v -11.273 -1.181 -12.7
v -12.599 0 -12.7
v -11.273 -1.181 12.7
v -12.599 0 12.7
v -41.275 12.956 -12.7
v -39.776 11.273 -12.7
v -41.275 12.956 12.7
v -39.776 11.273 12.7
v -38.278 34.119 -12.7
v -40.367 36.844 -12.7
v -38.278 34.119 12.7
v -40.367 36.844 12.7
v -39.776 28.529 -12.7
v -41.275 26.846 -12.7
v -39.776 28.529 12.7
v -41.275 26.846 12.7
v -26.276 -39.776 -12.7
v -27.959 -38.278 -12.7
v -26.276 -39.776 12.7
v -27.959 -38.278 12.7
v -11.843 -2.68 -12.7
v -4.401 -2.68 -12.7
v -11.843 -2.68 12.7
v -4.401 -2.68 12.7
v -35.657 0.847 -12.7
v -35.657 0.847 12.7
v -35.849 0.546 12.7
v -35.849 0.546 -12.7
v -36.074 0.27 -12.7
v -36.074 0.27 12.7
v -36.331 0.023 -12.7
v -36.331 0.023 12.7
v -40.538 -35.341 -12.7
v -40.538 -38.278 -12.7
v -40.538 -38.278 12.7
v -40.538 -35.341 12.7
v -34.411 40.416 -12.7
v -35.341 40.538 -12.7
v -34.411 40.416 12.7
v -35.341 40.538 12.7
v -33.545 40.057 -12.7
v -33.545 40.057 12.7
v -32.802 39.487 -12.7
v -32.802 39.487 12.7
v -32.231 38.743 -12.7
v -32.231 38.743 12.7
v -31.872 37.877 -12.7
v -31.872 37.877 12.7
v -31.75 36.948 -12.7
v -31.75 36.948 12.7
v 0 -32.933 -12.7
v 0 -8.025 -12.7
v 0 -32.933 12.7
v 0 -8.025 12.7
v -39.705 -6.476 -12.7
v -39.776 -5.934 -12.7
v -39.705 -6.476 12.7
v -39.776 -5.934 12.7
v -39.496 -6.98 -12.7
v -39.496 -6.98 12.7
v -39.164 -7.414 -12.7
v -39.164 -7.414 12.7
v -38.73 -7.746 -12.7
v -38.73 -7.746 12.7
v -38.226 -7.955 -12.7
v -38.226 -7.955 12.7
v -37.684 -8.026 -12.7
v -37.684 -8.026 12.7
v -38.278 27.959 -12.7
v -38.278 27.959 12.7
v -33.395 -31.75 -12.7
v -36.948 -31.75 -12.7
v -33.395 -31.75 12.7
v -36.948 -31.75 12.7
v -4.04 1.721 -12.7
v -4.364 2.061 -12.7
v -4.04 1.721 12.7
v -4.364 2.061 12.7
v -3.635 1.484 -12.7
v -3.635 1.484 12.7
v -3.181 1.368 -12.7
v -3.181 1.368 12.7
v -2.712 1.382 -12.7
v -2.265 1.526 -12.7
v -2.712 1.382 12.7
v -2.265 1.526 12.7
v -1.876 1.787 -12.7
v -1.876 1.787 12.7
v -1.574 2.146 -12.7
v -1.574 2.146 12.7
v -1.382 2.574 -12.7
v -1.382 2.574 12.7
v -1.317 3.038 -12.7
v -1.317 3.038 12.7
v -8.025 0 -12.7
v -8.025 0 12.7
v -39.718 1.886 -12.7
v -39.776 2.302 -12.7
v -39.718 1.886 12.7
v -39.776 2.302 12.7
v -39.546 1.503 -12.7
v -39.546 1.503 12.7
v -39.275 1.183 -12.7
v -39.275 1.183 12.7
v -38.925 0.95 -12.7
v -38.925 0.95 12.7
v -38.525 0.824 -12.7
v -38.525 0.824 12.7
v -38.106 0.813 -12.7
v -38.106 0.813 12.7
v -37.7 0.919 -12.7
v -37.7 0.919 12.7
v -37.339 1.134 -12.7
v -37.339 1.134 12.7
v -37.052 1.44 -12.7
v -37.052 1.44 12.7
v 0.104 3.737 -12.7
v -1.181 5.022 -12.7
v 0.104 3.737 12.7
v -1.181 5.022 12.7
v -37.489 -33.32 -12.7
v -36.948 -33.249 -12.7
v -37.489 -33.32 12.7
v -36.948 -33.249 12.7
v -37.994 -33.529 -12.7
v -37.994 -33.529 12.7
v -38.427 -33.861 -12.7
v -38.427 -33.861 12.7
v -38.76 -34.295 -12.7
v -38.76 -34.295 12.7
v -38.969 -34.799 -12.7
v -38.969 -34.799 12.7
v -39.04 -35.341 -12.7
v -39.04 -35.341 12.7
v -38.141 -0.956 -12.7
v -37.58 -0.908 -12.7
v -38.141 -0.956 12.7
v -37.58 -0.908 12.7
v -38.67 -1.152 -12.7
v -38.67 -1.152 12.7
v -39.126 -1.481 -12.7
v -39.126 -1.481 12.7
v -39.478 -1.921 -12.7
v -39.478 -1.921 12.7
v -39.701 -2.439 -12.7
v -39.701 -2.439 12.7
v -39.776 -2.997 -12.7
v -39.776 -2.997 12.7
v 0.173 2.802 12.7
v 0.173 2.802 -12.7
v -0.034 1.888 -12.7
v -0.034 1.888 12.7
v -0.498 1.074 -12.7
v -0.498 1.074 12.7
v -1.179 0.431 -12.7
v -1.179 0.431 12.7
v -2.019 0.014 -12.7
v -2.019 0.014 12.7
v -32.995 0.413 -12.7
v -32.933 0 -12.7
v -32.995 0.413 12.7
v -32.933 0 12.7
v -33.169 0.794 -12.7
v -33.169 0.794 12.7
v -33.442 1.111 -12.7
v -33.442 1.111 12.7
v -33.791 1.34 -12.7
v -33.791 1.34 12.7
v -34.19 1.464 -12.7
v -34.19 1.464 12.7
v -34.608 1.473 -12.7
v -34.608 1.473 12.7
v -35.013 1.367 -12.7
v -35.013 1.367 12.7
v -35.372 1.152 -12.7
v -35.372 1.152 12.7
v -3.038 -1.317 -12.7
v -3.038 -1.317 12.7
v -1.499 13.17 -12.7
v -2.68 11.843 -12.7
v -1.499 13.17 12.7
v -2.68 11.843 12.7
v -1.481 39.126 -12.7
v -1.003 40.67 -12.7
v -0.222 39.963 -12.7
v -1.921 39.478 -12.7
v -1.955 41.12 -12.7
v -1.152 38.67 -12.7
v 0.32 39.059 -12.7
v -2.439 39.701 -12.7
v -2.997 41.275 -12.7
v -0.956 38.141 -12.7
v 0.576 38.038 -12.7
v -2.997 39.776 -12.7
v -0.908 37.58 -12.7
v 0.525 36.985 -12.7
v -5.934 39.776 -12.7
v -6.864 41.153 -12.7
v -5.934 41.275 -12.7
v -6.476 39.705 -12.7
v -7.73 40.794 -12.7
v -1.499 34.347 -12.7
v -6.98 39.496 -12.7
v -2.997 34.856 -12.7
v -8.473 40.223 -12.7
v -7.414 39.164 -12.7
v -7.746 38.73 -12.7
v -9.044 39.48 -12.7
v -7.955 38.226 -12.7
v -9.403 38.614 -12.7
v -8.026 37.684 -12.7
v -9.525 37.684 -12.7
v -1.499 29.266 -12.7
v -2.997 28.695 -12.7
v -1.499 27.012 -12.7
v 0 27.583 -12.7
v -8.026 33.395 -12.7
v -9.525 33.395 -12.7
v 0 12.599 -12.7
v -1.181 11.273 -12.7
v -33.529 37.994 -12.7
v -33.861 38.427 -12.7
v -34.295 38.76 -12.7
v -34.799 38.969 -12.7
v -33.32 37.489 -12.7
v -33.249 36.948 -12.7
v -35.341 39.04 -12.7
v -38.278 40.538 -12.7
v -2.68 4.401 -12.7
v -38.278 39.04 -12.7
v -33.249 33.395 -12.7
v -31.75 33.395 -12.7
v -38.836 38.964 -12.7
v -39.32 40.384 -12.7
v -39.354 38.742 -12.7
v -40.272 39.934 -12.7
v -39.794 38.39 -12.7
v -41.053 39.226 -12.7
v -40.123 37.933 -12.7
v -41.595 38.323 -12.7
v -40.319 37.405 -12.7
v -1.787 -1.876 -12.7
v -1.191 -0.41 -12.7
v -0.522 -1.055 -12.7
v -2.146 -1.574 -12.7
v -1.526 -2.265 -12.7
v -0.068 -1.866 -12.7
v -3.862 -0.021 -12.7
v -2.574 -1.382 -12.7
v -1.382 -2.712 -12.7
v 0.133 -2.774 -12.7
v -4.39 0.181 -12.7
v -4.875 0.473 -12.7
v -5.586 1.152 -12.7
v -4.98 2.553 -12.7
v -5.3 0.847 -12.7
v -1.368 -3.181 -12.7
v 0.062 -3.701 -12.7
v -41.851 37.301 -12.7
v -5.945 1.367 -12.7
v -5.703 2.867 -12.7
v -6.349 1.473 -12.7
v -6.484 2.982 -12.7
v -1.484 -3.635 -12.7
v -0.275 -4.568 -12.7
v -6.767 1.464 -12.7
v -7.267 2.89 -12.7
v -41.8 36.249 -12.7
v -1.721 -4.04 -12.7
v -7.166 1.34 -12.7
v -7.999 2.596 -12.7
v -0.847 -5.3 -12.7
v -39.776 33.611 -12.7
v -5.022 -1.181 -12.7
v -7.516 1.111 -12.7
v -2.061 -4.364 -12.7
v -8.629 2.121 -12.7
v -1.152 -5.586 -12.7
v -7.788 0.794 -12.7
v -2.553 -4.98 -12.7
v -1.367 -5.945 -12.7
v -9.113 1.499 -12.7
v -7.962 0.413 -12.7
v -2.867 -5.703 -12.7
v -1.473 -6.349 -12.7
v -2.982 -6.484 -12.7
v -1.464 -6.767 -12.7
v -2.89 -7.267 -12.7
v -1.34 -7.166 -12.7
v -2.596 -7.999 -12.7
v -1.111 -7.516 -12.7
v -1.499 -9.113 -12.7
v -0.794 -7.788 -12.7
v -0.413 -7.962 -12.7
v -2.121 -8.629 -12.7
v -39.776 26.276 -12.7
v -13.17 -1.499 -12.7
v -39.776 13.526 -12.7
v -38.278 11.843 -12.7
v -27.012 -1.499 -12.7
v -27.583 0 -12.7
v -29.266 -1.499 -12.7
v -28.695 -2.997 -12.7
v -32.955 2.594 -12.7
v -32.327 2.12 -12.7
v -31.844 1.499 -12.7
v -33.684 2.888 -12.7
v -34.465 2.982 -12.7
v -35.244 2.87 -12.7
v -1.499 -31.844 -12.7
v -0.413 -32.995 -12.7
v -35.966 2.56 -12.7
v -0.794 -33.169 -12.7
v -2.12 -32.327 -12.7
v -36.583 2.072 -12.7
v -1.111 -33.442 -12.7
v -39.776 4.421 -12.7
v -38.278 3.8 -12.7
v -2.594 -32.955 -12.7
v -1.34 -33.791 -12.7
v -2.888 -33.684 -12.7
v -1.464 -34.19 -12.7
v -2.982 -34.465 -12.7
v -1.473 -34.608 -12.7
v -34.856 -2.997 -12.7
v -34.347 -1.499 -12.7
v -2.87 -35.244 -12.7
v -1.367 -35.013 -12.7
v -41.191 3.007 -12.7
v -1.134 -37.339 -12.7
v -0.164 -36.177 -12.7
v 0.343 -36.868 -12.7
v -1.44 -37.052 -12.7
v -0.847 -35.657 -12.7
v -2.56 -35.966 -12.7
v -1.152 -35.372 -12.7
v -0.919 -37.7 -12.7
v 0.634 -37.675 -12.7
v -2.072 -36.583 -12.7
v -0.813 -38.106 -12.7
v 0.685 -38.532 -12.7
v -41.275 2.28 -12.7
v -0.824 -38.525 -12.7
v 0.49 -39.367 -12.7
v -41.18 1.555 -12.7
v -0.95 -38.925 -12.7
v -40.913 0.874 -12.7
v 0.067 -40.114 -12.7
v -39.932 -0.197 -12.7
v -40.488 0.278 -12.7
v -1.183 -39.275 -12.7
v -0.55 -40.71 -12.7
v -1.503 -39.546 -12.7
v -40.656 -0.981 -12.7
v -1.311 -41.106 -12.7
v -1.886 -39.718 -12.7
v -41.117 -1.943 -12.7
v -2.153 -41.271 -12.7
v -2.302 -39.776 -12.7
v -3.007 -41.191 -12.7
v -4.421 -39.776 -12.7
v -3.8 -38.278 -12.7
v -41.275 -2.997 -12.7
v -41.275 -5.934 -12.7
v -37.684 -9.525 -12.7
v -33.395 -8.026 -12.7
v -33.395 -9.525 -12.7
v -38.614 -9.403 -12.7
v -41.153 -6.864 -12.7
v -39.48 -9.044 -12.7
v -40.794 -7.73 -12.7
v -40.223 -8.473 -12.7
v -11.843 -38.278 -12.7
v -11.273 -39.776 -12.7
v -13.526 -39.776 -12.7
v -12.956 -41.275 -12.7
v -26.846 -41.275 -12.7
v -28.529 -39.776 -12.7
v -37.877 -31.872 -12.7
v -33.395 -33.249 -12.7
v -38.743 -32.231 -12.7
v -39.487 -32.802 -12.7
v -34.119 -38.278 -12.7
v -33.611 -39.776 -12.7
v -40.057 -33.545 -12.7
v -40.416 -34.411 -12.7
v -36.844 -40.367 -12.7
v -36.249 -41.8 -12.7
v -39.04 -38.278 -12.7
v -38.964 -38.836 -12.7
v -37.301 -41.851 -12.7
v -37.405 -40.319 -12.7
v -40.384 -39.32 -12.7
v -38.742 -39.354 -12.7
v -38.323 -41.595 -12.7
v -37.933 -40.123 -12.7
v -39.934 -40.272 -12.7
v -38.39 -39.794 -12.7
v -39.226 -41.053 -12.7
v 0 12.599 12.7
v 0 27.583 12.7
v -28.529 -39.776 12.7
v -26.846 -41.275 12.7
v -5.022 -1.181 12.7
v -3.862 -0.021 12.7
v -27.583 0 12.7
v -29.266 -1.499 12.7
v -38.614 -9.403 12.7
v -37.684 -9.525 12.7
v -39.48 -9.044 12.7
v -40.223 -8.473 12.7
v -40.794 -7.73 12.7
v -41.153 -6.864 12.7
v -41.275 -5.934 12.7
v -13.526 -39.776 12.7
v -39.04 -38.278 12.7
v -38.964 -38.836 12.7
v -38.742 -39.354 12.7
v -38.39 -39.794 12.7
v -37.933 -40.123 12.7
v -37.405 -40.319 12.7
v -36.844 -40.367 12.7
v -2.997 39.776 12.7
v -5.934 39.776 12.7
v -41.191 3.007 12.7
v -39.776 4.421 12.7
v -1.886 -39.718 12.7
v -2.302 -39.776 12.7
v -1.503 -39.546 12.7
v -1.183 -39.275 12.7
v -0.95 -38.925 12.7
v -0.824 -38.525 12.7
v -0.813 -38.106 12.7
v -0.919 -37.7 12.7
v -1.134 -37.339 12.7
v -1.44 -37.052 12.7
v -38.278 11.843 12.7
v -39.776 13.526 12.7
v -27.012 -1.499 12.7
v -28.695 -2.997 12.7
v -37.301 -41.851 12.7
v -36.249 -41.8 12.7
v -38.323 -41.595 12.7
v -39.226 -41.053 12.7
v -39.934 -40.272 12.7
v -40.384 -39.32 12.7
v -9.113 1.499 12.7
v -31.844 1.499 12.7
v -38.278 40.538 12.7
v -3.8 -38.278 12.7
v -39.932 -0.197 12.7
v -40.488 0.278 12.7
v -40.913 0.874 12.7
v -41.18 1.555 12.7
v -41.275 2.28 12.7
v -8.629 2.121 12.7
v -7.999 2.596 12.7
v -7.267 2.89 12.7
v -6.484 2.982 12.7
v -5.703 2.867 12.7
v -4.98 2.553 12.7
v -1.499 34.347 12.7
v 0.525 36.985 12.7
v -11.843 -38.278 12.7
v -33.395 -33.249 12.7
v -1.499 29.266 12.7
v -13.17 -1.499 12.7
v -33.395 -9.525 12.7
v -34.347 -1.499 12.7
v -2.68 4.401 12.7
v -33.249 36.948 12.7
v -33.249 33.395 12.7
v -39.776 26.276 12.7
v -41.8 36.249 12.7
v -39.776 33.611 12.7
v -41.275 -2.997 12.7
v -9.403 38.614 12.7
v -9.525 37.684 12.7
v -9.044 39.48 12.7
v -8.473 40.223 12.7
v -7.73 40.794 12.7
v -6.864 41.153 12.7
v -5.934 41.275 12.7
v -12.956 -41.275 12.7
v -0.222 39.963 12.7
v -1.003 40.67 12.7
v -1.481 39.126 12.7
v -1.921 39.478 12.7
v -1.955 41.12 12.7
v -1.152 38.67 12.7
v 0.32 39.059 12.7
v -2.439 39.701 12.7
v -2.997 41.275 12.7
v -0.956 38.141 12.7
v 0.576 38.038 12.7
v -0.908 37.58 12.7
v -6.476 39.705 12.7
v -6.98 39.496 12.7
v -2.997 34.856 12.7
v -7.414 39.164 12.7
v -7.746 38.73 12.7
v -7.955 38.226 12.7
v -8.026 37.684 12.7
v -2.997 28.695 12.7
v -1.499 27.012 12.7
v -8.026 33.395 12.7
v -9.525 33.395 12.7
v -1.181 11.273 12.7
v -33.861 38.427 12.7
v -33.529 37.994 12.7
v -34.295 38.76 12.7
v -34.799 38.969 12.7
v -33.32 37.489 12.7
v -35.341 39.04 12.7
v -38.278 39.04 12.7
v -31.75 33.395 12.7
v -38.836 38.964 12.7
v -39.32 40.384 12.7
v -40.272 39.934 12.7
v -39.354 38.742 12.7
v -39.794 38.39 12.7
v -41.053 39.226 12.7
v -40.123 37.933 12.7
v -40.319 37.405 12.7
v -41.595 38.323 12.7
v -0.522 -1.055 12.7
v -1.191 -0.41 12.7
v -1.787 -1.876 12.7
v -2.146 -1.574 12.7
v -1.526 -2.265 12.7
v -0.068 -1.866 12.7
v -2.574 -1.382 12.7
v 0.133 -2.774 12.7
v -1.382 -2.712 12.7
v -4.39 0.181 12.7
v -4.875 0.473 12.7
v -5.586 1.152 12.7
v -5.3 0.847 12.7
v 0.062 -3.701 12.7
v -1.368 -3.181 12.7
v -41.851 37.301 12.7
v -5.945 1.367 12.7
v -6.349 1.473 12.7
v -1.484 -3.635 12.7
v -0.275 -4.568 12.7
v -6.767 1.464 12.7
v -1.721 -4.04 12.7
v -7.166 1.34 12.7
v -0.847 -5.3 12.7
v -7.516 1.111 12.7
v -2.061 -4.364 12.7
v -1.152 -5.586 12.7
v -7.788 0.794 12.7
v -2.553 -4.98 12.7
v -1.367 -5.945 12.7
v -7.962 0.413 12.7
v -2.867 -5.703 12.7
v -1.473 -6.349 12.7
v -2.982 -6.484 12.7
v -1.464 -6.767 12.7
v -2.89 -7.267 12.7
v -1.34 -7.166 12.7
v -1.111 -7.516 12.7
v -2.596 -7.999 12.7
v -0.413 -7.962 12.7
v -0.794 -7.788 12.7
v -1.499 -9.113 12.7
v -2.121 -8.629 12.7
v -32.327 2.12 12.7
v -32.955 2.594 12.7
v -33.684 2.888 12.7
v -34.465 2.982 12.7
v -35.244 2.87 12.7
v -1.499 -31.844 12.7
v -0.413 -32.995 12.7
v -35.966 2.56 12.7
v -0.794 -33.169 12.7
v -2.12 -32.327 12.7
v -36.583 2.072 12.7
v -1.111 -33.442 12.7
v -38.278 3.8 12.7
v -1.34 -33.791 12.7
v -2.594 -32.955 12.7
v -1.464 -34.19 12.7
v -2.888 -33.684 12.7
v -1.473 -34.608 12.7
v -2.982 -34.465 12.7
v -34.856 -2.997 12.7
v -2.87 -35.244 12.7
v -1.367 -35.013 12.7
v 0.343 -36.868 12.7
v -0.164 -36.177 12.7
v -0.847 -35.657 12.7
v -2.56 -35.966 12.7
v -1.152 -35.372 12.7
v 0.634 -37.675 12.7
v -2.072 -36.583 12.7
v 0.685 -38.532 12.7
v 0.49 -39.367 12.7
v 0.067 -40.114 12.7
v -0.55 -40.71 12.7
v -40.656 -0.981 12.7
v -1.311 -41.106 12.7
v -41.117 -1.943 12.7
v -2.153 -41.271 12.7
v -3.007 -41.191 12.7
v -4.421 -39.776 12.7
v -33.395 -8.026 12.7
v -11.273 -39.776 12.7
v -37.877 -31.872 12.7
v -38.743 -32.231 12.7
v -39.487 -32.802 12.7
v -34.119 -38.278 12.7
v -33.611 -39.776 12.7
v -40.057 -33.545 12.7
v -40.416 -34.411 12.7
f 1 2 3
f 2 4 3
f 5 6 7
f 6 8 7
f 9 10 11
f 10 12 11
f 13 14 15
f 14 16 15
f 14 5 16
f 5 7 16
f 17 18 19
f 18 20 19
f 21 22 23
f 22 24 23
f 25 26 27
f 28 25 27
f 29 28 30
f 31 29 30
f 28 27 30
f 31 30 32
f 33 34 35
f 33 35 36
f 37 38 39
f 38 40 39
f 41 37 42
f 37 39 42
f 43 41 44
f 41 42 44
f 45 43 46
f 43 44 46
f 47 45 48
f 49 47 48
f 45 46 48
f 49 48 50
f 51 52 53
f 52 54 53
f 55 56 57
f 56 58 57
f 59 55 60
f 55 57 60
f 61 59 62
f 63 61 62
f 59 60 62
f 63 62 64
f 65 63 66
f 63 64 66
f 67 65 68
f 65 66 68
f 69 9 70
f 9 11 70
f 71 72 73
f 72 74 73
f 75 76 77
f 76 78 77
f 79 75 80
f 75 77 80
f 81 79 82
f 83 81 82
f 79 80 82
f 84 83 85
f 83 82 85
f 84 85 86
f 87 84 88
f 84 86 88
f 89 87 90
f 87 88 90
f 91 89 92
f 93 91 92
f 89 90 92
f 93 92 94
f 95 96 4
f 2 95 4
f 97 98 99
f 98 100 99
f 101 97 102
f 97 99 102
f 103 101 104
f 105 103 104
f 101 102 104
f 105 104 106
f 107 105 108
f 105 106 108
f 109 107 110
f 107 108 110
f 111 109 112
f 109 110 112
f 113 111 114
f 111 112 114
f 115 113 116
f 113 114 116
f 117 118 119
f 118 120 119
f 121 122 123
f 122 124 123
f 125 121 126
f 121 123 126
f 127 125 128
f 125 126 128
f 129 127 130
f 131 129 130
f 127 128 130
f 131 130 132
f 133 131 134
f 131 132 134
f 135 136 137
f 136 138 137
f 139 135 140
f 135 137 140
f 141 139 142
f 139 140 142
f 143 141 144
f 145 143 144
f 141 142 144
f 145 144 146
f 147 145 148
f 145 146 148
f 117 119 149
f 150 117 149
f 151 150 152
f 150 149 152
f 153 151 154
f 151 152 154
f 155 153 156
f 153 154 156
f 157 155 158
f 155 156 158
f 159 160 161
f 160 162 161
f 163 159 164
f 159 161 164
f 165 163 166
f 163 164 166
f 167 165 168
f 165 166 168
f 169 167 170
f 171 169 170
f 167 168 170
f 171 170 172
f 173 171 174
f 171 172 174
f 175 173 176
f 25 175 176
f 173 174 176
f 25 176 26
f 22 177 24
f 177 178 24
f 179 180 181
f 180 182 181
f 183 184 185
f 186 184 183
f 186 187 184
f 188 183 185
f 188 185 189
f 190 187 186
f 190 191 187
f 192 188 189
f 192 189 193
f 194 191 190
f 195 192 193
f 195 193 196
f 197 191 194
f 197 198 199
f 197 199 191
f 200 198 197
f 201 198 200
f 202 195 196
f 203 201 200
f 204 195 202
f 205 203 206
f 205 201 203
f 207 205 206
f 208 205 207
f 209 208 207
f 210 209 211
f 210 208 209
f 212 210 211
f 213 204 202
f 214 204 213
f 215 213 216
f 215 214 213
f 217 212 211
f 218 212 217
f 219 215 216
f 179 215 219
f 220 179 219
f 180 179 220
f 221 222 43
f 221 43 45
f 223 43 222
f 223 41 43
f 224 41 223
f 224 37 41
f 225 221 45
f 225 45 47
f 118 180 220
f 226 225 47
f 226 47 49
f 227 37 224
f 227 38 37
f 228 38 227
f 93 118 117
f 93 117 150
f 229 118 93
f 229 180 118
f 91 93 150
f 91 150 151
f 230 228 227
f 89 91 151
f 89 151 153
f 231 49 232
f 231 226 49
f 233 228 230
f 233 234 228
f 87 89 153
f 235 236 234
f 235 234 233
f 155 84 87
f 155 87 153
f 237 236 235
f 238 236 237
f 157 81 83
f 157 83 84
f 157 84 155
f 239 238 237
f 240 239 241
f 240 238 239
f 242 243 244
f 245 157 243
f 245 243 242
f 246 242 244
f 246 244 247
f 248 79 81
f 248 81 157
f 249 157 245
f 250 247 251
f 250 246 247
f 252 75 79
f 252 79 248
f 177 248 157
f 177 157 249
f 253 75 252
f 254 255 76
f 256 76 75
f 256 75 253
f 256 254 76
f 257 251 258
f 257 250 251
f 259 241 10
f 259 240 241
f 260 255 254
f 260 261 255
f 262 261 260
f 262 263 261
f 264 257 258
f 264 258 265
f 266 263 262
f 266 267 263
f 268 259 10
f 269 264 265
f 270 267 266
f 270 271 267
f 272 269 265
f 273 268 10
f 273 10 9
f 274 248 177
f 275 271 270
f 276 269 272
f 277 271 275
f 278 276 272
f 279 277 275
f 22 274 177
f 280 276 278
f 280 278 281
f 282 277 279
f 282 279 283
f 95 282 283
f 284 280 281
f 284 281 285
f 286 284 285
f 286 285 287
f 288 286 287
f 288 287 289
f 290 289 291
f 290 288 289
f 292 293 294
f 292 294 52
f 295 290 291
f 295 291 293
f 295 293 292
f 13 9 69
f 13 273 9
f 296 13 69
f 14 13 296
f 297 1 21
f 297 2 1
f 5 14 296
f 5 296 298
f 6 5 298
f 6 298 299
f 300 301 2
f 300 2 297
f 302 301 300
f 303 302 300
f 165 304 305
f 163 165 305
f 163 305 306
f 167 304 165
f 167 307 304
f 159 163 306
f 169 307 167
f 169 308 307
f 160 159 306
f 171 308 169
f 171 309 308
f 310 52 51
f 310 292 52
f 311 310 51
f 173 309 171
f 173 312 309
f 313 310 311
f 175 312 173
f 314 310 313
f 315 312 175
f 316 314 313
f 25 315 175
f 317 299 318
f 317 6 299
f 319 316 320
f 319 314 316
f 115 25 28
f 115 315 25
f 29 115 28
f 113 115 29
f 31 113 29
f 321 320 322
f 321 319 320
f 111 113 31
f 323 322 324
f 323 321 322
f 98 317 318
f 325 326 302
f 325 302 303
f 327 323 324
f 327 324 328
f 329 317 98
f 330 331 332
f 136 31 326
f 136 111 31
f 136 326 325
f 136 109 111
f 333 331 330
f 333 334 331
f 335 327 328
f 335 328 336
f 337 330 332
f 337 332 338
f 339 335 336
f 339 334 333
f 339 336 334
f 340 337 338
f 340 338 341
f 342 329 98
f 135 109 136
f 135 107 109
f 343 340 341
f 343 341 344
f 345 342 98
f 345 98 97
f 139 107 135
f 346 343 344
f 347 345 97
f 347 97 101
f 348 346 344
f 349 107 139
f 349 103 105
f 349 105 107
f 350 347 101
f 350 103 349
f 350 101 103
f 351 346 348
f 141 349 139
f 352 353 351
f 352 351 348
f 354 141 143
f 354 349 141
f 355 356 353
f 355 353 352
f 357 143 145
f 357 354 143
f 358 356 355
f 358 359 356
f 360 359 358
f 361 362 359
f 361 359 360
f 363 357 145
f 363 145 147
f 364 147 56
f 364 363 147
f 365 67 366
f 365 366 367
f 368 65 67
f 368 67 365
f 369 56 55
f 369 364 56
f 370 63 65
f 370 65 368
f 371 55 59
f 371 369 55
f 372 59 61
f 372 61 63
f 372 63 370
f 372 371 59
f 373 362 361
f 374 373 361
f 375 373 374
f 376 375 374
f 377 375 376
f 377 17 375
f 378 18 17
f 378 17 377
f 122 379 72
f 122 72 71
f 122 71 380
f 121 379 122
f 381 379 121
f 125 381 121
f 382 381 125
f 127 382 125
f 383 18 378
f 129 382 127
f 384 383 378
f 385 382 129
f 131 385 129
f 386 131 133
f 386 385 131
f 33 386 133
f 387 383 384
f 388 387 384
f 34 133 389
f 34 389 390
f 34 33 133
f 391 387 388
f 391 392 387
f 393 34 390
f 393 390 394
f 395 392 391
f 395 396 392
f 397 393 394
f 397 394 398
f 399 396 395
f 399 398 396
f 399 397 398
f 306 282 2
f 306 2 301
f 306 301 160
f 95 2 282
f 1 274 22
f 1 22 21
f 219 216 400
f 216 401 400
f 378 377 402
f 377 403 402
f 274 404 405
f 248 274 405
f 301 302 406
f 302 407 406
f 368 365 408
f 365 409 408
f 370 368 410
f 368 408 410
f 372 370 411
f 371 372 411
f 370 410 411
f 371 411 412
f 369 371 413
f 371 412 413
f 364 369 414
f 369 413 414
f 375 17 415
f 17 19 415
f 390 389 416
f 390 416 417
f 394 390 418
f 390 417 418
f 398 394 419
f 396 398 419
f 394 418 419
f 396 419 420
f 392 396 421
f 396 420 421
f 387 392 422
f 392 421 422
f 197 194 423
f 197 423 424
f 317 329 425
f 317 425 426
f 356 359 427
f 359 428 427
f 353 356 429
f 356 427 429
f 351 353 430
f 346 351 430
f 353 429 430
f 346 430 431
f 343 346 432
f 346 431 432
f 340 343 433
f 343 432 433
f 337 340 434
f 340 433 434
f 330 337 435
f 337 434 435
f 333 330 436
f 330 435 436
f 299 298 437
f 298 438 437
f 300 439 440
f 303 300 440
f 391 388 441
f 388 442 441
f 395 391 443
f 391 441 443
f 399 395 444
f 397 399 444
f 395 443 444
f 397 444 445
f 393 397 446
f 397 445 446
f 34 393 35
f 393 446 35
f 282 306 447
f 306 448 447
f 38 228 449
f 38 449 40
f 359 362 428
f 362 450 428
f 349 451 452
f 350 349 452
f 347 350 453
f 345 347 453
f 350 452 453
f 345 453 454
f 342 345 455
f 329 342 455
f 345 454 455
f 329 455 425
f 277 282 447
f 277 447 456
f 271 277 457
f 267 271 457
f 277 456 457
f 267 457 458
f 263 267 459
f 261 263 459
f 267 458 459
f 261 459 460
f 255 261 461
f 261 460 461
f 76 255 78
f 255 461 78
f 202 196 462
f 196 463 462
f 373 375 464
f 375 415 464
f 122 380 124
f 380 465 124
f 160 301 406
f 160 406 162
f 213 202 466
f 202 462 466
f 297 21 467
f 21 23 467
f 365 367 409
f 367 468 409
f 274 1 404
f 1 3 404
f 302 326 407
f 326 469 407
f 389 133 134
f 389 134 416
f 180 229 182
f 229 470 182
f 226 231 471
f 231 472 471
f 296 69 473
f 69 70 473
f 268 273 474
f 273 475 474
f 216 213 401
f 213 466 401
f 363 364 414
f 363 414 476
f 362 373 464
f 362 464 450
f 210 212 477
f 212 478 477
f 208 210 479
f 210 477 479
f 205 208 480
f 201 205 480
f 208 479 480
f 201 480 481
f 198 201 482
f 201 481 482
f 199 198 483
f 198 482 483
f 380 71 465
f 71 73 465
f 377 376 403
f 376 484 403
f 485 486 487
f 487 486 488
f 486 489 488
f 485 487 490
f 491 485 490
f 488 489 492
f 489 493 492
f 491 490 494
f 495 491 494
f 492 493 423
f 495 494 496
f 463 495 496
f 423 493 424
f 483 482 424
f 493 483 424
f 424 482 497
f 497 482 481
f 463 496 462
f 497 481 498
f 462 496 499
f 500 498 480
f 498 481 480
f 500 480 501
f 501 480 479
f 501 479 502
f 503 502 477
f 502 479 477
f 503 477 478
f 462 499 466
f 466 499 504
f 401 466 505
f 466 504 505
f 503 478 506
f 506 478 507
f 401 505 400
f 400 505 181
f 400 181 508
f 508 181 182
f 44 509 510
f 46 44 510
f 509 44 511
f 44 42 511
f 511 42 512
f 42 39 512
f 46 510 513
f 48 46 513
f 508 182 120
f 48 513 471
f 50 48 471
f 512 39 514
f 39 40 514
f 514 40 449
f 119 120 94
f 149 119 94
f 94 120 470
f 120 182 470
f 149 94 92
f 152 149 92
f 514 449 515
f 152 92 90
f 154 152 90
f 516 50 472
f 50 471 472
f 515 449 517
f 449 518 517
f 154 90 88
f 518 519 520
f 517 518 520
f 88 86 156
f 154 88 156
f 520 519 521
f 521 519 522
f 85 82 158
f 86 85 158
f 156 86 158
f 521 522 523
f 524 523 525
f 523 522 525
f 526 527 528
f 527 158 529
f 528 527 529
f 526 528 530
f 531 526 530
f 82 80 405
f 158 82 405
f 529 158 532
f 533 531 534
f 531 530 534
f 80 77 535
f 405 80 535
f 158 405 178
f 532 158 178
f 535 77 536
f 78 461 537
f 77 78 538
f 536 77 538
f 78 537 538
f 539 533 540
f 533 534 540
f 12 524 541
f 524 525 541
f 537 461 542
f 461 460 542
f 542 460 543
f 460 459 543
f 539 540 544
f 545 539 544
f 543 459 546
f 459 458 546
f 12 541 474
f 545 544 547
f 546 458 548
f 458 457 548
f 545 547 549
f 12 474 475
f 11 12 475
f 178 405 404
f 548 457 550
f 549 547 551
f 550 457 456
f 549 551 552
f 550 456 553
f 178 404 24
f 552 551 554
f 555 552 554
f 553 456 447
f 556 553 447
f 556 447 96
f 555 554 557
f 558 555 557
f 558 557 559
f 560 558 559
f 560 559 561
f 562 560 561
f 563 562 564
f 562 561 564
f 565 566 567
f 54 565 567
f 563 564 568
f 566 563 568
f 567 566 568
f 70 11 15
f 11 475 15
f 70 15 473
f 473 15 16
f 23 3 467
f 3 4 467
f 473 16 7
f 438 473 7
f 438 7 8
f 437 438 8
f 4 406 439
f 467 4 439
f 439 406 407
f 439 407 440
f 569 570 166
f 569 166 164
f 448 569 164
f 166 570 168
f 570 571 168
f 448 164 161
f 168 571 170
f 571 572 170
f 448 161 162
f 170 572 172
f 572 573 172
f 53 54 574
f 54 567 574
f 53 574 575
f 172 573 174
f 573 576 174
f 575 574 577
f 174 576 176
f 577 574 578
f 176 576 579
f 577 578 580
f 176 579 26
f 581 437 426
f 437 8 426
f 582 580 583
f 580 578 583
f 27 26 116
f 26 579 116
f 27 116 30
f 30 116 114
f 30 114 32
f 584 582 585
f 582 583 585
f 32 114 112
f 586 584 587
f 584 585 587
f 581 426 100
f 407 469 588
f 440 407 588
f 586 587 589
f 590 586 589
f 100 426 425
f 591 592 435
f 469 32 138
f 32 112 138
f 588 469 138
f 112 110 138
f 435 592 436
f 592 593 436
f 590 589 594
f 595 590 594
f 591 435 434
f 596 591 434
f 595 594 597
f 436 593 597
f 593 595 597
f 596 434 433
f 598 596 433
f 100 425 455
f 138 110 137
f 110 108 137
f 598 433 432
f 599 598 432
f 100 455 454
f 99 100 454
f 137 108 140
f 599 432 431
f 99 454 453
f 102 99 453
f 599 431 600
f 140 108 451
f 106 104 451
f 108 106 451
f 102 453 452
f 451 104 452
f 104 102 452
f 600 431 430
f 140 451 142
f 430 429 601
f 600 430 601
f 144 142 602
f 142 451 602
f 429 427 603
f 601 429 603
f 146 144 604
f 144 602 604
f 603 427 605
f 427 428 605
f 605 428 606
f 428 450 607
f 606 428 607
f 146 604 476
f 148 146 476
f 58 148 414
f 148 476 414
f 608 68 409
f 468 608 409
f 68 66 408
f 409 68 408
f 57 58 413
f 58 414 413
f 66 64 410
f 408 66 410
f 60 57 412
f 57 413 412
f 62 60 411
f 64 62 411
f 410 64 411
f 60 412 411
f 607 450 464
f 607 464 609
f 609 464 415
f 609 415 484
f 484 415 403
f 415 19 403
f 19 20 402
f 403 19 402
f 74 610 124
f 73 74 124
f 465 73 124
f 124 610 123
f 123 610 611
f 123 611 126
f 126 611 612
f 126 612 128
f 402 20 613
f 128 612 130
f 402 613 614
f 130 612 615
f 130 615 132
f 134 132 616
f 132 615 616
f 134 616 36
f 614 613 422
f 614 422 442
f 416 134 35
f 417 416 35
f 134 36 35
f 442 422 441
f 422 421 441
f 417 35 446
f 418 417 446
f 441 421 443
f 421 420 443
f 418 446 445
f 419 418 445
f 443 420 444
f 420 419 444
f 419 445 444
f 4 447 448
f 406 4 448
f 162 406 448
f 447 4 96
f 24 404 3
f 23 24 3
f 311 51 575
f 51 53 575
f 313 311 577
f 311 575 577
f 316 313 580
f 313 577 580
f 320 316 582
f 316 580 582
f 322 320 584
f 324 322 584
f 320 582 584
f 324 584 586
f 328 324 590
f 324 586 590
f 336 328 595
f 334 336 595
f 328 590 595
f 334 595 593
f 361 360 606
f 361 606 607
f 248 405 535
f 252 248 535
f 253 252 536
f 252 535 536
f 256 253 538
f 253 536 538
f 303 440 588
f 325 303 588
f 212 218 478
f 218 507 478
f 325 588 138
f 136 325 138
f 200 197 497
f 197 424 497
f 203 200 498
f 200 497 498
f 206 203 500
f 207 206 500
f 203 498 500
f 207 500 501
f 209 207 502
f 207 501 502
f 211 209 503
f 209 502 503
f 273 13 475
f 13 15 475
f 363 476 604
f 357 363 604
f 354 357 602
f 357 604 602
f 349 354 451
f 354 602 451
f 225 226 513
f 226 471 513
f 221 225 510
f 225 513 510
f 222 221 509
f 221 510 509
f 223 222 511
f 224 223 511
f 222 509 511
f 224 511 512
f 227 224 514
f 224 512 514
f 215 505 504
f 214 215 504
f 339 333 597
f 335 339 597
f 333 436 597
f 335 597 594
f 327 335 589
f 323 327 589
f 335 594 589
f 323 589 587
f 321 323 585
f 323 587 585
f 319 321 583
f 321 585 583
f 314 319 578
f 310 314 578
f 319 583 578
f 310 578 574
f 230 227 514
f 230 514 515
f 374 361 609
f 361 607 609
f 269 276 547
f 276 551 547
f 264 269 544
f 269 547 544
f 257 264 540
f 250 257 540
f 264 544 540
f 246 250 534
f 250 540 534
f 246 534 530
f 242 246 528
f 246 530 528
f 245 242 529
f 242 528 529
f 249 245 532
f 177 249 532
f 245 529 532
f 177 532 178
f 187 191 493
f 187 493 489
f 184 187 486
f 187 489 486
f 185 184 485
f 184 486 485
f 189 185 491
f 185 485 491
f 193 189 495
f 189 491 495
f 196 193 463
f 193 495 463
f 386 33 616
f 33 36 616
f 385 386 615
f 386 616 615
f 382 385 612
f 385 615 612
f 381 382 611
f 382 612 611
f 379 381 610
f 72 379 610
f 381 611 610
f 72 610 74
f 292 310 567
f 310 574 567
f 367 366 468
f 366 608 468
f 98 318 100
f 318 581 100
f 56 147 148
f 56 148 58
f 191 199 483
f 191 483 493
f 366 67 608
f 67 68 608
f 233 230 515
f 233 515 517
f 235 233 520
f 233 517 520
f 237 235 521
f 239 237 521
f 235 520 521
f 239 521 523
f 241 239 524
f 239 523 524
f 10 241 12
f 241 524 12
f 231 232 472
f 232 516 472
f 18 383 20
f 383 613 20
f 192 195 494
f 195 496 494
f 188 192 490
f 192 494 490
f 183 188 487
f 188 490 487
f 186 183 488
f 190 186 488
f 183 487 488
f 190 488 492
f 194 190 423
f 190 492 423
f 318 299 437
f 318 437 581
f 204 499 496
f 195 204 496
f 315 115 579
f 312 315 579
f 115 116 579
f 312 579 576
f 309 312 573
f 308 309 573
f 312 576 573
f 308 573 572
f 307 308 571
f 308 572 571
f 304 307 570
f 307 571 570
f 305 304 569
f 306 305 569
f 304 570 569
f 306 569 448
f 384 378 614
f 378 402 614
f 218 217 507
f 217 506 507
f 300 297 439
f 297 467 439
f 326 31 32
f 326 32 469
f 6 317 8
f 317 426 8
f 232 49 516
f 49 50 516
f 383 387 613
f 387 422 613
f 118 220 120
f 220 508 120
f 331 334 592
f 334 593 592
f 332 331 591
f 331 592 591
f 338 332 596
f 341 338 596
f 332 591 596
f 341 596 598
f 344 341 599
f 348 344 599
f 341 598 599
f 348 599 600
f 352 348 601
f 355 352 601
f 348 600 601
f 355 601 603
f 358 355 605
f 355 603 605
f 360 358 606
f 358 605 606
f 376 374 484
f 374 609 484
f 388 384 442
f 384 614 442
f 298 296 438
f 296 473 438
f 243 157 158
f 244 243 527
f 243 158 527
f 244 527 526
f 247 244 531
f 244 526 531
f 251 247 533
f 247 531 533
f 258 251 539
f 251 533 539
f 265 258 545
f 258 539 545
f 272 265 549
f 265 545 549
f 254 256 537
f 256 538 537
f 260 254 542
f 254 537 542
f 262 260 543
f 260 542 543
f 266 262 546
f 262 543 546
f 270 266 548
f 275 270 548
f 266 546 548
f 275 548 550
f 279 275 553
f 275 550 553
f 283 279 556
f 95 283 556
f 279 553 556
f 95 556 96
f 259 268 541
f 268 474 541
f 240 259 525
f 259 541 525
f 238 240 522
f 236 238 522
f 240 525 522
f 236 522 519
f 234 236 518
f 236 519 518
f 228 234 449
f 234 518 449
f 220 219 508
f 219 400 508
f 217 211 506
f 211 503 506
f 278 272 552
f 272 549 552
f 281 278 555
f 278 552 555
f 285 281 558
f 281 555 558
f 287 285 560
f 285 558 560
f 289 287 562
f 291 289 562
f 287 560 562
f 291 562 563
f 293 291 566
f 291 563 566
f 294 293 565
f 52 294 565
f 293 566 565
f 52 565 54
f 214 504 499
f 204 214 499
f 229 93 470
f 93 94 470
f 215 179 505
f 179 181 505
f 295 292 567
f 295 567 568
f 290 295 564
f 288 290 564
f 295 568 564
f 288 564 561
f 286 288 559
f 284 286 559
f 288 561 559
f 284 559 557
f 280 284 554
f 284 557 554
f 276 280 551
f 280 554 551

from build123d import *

# Parameters (mm, degrees)
BASE_EXTRUDE_DEPTH = 12.7
CIRPATTERN1_COUNT  = 2
CIRPATTERN1_ANGLE  = 90


with BuildPart() as part:
    # Sketch1 → Base-Extrude (new, symmetric)
    with BuildSketch(Plane(origin=(-20.32, 17.78, 0), x_dir=(1, 0, 0), z_dir=(0, 0, 1))):
        with BuildLine():
            Line((17.3228, 17.075886512), (19.412382578, 19.800133504))
            ThreePointArc((19.412382578, 19.800133504), (18.838545845, 21.346344632), (17.3228, 21.9964))
            Line((17.3228, 21.9964), (14.38577367, 21.9964))
            ThreePointArc((14.38577367, 21.9964), (12.906383481, 21.383616519), (12.2936, 19.90422633))
            Line((12.2936, 19.90422633), (12.2936, 15.61465))
            Line((12.2936, 15.61465), (10.795, 15.61465))
            Line((10.795, 15.61465), (10.795, 19.90422633))
            ThreePointArc((10.795, 19.90422633), (11.846713258, 22.443286742), (14.38577367, 23.495))
            Line((14.38577367, 23.495), (17.3228, 23.495))
            ThreePointArc((17.3228, 23.495), (20.097934554, 22.182884653), (20.844928673, 19.2054666))
            Line((20.844928673, 19.2054666), (18.8214, 16.567335923))
            Line((18.8214, 16.567335923), (18.8214, 11.485729415))
            Line((18.8214, 11.485729415), (20.32, 9.8028125))
            Line((20.32, 9.8028125), (20.32, -5.180962694))
            Line((20.32, -5.180962694), (19.1389, -6.507329415))
            Line((19.1389, -6.507329415), (19.1389, -12.757931546))
            Line((19.1389, -12.757931546), (20.424084837, -14.043116383))
            ThreePointArc((20.424084837, -14.043116383), (18.821804006, -17.54486751), (15.019825564, -16.932883251))
            ThreePointArc((15.019825564, -16.932883251), (13.348875824, -16.363652979), (12.29528328, -17.78))
            Line((12.29528328, -17.78), (-12.61278328, -17.78))
            ThreePointArc((-12.61278328, -17.78), (-13.666375824, -16.363652979), (-15.337325564, -16.932883251))
            ThreePointArc((-15.337325564, -16.932883251), (-19.047442105, -18.270236732), (-20.870958003, -14.773342558))
            Line((-20.870958003, -14.773342558), (-19.4564, -13.358784555))
            Line((-19.4564, -13.358784555), (-19.4564, -6.507329415))
            Line((-19.4564, -6.507329415), (-20.955, -4.8244125))
            Line((-20.955, -4.8244125), (-20.955, 9.0662125))
            Line((-20.955, 9.0662125), (-19.4564, 10.749129415))
            Line((-19.4564, 10.749129415), (-19.4564, 15.830735923))
            Line((-19.4564, 15.830735923), (-21.479928673, 18.4688666))
            ThreePointArc((-21.479928673, 18.4688666), (-20.732934554, 21.446284653), (-17.9578, 22.7584))
            Line((-17.9578, 22.7584), (-15.02077367, 22.7584))
            ThreePointArc((-15.02077367, 22.7584), (-12.481713258, 21.706686742), (-11.43, 19.16762633))
            Line((-11.43, 19.16762633), (-11.43, 15.61465))
            Line((-11.43, 15.61465), (-12.9286, 15.61465))
            Line((-12.9286, 15.61465), (-12.9286, 19.16762633))
            ThreePointArc((-12.9286, 19.16762633), (-13.541383481, 20.647016519), (-15.02077367, 21.2598))
            Line((-15.02077367, 21.2598), (-17.9578, 21.2598))
            ThreePointArc((-17.9578, 21.2598), (-19.473545845, 20.609744632), (-20.047382578, 19.063533504))
            Line((-20.047382578, 19.063533504), (-17.9578, 16.339286512))
            Line((-17.9578, 16.339286512), (-17.9578, 10.17860201))
            Line((-17.9578, 10.17860201), (-19.4564, 8.495685095))
            Line((-19.4564, 8.495685095), (-19.4564, -4.253885095))
            Line((-19.4564, -4.253885095), (-17.9578, -5.93680201))
            Line((-17.9578, -5.93680201), (-17.9578, -13.979525))
            Line((-17.9578, -13.979525), (-19.4564, -15.478125))
            ThreePointArc((-19.4564, -15.478125), (-18.409738669, -16.906954381), (-16.731785827, -16.33992034))
            ThreePointArc((-16.731785827, -16.33992034), (-14.14499029, -14.797667818), (-11.524190259, -16.2814))
            Line((-11.524190259, -16.2814), (11.206690259, -16.2814))
            ThreePointArc((11.206690259, -16.2814), (13.441553644, -14.818250812), (15.956217628, -15.719297395))
            ThreePointArc((15.956217628, -15.719297395), (17.836242029, -16.3415136), (19.00315301, -14.741525))
            Line((19.00315301, -14.741525), (17.6403, -13.37867199))
            Line((17.6403, -13.37867199), (17.6403, -5.93680201))
            Line((17.6403, -5.93680201), (18.8214, -4.610435289))
            Line((18.8214, -4.610435289), (18.8214, 9.232285095))
            Line((18.8214, 9.232285095), (17.3228, 10.91520201))
            Line((17.3228, 10.91520201), (17.3228, 17.075886512))
        make_face()
    base_extrude = extrude(amount=BASE_EXTRUDE_DEPTH, both=True)

    # CirPattern1: Base-Extrude ×2 about axis
    cirpattern1_axis = Axis((0, 0, 0), (0, 0, 1))
    for i in range(1, CIRPATTERN1_COUNT):
        add(base_extrude.rotate(cirpattern1_axis, i * CIRPATTERN1_ANGLE / (CIRPATTERN1_COUNT - 1)))


solid = part.part
